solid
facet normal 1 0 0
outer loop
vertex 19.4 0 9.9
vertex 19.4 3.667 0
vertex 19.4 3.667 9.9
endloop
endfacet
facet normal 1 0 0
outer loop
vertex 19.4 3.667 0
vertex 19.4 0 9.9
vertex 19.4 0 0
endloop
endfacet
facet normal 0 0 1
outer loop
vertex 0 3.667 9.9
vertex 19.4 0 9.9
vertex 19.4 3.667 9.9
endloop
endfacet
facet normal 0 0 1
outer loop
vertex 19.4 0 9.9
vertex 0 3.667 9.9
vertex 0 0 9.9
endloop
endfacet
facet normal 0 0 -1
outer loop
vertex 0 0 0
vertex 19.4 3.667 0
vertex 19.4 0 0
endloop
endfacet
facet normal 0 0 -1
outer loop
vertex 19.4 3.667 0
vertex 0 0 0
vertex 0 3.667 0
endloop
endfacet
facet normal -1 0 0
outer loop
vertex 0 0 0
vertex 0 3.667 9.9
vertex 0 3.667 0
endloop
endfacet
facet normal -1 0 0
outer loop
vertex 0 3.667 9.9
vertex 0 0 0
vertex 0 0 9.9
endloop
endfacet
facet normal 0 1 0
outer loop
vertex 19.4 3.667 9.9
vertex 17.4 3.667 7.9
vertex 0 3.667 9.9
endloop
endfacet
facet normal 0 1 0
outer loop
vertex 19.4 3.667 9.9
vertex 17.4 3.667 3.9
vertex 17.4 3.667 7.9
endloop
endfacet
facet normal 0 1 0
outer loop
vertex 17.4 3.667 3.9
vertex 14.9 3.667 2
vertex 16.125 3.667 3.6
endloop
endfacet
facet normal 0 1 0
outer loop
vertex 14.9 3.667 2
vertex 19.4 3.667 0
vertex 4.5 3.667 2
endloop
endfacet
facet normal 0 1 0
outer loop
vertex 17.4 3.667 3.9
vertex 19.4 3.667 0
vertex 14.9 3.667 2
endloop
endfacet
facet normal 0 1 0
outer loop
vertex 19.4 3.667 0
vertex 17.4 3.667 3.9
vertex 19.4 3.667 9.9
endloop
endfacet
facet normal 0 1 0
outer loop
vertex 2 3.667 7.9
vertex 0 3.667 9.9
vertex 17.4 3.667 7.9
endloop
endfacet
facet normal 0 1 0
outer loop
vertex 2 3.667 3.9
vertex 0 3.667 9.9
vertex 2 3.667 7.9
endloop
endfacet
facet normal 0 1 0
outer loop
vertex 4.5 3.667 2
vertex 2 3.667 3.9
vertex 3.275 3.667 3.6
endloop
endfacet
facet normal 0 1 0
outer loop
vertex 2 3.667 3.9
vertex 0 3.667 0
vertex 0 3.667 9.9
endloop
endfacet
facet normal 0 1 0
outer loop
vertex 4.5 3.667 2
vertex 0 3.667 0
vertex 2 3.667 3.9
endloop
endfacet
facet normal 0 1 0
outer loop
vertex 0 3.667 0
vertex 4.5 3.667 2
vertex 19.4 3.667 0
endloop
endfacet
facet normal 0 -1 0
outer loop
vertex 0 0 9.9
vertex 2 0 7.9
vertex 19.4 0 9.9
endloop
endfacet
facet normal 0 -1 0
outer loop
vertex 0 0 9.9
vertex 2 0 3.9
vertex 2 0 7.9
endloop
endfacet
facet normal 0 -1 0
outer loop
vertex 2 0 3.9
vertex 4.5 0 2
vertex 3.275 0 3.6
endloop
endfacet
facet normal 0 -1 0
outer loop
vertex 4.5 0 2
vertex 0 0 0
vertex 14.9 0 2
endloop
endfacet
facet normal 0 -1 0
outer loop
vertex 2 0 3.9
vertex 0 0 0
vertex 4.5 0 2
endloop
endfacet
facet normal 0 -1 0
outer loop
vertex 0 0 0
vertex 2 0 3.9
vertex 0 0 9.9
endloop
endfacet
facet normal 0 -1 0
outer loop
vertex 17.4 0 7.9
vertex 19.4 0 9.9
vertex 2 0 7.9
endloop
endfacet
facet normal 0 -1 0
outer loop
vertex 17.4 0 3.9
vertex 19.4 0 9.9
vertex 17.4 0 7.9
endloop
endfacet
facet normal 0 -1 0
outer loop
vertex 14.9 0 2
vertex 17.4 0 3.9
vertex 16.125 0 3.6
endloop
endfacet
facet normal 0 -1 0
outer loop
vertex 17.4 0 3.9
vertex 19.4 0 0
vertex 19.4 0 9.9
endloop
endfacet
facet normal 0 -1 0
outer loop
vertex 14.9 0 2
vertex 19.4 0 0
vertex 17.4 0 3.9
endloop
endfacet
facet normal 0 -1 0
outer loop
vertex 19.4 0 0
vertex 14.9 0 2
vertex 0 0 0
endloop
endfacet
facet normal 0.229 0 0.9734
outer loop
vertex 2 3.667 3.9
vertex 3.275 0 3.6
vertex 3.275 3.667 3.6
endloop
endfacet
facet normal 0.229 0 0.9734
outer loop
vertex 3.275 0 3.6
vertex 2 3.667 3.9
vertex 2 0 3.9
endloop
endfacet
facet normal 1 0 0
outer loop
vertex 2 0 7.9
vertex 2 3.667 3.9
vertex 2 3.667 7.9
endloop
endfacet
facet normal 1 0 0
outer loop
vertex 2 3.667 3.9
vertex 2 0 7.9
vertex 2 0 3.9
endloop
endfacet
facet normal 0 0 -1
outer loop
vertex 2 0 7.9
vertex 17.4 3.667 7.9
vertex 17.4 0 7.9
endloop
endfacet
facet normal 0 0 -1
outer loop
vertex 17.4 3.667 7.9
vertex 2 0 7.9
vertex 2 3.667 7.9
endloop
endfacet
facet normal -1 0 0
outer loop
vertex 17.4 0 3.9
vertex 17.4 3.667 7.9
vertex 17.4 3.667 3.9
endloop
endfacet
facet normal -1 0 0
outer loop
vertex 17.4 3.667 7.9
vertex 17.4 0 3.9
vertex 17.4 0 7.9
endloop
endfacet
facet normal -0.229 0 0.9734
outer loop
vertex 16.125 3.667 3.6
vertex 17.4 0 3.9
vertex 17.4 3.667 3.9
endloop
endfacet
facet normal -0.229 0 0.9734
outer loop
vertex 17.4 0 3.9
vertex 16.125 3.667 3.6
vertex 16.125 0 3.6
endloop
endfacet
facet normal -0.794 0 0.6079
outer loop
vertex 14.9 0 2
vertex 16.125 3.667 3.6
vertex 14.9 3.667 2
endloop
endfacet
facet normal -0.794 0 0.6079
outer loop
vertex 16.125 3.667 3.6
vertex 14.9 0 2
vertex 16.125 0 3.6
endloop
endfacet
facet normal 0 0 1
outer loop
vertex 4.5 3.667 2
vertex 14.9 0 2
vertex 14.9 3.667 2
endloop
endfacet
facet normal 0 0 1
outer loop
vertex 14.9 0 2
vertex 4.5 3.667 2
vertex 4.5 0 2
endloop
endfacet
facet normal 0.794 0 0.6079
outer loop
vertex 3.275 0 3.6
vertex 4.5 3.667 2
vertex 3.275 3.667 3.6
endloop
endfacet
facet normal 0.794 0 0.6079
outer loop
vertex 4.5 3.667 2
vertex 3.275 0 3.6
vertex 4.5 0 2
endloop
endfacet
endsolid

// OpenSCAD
// Start: lazy_union
default_5_default_5();
// End: lazy_union

// Modules.

// 'PartMaterial undef-default - default 5.0'
module default_5_default_5() {
  // 'None : _combine_solids_and_holes'
  union() {
    // '_combine_solids_and_holes'
    difference() {
      // 'default : _combine_solids_and_holes'
      union() {
        // 'test : _combine_solids_and_holes'
        union() {
          // 'test'
          cube(size=[19.4, 3.6666666666666665, 9.9]);
        }
      }
      // 'default'
      multmatrix(m=[[1.0, 0.0, 0.0, 9.7], [0.0, 1.0, 0.0, 1.8333333333333333], [0.0, 0.0, 1.0, 4.95], [0.0, 0.0, 0.0, 1.0]]) {
        // 'outline : _combine_solids_and_holes'
        union() {
          // 'hdmi'
          multmatrix(m=[[-1.0, 0.0, 0.0, 0.0], [0.0, 0.0, 1.0, -5.5], [0.0, 1.0, 0.0, -2.95], [0.0, 0.0, 0.0, 1.0]]) {
            // 'hdmi : _combine_solids_and_holes'
            union() {
              // 'hdmi'
              linear_extrude(height=11.0, twist=0.0, slices=4, scale=[1.0, 1.0]) {
                polygon(points=[[0.0, 0.0], [-5.199999999999999, 0.0], [-6.425, 1.6000000000000005], [-7.7, 1.9000000000000004], [-7.7, 5.9], [7.7, 5.9], [7.7, 1.9000000000000004], [6.425, 1.6000000000000005], [5.199999999999999, 0.0]]);
              }
            }
          }
        }
      }
    }
  }
} // end module default_5_default_5
